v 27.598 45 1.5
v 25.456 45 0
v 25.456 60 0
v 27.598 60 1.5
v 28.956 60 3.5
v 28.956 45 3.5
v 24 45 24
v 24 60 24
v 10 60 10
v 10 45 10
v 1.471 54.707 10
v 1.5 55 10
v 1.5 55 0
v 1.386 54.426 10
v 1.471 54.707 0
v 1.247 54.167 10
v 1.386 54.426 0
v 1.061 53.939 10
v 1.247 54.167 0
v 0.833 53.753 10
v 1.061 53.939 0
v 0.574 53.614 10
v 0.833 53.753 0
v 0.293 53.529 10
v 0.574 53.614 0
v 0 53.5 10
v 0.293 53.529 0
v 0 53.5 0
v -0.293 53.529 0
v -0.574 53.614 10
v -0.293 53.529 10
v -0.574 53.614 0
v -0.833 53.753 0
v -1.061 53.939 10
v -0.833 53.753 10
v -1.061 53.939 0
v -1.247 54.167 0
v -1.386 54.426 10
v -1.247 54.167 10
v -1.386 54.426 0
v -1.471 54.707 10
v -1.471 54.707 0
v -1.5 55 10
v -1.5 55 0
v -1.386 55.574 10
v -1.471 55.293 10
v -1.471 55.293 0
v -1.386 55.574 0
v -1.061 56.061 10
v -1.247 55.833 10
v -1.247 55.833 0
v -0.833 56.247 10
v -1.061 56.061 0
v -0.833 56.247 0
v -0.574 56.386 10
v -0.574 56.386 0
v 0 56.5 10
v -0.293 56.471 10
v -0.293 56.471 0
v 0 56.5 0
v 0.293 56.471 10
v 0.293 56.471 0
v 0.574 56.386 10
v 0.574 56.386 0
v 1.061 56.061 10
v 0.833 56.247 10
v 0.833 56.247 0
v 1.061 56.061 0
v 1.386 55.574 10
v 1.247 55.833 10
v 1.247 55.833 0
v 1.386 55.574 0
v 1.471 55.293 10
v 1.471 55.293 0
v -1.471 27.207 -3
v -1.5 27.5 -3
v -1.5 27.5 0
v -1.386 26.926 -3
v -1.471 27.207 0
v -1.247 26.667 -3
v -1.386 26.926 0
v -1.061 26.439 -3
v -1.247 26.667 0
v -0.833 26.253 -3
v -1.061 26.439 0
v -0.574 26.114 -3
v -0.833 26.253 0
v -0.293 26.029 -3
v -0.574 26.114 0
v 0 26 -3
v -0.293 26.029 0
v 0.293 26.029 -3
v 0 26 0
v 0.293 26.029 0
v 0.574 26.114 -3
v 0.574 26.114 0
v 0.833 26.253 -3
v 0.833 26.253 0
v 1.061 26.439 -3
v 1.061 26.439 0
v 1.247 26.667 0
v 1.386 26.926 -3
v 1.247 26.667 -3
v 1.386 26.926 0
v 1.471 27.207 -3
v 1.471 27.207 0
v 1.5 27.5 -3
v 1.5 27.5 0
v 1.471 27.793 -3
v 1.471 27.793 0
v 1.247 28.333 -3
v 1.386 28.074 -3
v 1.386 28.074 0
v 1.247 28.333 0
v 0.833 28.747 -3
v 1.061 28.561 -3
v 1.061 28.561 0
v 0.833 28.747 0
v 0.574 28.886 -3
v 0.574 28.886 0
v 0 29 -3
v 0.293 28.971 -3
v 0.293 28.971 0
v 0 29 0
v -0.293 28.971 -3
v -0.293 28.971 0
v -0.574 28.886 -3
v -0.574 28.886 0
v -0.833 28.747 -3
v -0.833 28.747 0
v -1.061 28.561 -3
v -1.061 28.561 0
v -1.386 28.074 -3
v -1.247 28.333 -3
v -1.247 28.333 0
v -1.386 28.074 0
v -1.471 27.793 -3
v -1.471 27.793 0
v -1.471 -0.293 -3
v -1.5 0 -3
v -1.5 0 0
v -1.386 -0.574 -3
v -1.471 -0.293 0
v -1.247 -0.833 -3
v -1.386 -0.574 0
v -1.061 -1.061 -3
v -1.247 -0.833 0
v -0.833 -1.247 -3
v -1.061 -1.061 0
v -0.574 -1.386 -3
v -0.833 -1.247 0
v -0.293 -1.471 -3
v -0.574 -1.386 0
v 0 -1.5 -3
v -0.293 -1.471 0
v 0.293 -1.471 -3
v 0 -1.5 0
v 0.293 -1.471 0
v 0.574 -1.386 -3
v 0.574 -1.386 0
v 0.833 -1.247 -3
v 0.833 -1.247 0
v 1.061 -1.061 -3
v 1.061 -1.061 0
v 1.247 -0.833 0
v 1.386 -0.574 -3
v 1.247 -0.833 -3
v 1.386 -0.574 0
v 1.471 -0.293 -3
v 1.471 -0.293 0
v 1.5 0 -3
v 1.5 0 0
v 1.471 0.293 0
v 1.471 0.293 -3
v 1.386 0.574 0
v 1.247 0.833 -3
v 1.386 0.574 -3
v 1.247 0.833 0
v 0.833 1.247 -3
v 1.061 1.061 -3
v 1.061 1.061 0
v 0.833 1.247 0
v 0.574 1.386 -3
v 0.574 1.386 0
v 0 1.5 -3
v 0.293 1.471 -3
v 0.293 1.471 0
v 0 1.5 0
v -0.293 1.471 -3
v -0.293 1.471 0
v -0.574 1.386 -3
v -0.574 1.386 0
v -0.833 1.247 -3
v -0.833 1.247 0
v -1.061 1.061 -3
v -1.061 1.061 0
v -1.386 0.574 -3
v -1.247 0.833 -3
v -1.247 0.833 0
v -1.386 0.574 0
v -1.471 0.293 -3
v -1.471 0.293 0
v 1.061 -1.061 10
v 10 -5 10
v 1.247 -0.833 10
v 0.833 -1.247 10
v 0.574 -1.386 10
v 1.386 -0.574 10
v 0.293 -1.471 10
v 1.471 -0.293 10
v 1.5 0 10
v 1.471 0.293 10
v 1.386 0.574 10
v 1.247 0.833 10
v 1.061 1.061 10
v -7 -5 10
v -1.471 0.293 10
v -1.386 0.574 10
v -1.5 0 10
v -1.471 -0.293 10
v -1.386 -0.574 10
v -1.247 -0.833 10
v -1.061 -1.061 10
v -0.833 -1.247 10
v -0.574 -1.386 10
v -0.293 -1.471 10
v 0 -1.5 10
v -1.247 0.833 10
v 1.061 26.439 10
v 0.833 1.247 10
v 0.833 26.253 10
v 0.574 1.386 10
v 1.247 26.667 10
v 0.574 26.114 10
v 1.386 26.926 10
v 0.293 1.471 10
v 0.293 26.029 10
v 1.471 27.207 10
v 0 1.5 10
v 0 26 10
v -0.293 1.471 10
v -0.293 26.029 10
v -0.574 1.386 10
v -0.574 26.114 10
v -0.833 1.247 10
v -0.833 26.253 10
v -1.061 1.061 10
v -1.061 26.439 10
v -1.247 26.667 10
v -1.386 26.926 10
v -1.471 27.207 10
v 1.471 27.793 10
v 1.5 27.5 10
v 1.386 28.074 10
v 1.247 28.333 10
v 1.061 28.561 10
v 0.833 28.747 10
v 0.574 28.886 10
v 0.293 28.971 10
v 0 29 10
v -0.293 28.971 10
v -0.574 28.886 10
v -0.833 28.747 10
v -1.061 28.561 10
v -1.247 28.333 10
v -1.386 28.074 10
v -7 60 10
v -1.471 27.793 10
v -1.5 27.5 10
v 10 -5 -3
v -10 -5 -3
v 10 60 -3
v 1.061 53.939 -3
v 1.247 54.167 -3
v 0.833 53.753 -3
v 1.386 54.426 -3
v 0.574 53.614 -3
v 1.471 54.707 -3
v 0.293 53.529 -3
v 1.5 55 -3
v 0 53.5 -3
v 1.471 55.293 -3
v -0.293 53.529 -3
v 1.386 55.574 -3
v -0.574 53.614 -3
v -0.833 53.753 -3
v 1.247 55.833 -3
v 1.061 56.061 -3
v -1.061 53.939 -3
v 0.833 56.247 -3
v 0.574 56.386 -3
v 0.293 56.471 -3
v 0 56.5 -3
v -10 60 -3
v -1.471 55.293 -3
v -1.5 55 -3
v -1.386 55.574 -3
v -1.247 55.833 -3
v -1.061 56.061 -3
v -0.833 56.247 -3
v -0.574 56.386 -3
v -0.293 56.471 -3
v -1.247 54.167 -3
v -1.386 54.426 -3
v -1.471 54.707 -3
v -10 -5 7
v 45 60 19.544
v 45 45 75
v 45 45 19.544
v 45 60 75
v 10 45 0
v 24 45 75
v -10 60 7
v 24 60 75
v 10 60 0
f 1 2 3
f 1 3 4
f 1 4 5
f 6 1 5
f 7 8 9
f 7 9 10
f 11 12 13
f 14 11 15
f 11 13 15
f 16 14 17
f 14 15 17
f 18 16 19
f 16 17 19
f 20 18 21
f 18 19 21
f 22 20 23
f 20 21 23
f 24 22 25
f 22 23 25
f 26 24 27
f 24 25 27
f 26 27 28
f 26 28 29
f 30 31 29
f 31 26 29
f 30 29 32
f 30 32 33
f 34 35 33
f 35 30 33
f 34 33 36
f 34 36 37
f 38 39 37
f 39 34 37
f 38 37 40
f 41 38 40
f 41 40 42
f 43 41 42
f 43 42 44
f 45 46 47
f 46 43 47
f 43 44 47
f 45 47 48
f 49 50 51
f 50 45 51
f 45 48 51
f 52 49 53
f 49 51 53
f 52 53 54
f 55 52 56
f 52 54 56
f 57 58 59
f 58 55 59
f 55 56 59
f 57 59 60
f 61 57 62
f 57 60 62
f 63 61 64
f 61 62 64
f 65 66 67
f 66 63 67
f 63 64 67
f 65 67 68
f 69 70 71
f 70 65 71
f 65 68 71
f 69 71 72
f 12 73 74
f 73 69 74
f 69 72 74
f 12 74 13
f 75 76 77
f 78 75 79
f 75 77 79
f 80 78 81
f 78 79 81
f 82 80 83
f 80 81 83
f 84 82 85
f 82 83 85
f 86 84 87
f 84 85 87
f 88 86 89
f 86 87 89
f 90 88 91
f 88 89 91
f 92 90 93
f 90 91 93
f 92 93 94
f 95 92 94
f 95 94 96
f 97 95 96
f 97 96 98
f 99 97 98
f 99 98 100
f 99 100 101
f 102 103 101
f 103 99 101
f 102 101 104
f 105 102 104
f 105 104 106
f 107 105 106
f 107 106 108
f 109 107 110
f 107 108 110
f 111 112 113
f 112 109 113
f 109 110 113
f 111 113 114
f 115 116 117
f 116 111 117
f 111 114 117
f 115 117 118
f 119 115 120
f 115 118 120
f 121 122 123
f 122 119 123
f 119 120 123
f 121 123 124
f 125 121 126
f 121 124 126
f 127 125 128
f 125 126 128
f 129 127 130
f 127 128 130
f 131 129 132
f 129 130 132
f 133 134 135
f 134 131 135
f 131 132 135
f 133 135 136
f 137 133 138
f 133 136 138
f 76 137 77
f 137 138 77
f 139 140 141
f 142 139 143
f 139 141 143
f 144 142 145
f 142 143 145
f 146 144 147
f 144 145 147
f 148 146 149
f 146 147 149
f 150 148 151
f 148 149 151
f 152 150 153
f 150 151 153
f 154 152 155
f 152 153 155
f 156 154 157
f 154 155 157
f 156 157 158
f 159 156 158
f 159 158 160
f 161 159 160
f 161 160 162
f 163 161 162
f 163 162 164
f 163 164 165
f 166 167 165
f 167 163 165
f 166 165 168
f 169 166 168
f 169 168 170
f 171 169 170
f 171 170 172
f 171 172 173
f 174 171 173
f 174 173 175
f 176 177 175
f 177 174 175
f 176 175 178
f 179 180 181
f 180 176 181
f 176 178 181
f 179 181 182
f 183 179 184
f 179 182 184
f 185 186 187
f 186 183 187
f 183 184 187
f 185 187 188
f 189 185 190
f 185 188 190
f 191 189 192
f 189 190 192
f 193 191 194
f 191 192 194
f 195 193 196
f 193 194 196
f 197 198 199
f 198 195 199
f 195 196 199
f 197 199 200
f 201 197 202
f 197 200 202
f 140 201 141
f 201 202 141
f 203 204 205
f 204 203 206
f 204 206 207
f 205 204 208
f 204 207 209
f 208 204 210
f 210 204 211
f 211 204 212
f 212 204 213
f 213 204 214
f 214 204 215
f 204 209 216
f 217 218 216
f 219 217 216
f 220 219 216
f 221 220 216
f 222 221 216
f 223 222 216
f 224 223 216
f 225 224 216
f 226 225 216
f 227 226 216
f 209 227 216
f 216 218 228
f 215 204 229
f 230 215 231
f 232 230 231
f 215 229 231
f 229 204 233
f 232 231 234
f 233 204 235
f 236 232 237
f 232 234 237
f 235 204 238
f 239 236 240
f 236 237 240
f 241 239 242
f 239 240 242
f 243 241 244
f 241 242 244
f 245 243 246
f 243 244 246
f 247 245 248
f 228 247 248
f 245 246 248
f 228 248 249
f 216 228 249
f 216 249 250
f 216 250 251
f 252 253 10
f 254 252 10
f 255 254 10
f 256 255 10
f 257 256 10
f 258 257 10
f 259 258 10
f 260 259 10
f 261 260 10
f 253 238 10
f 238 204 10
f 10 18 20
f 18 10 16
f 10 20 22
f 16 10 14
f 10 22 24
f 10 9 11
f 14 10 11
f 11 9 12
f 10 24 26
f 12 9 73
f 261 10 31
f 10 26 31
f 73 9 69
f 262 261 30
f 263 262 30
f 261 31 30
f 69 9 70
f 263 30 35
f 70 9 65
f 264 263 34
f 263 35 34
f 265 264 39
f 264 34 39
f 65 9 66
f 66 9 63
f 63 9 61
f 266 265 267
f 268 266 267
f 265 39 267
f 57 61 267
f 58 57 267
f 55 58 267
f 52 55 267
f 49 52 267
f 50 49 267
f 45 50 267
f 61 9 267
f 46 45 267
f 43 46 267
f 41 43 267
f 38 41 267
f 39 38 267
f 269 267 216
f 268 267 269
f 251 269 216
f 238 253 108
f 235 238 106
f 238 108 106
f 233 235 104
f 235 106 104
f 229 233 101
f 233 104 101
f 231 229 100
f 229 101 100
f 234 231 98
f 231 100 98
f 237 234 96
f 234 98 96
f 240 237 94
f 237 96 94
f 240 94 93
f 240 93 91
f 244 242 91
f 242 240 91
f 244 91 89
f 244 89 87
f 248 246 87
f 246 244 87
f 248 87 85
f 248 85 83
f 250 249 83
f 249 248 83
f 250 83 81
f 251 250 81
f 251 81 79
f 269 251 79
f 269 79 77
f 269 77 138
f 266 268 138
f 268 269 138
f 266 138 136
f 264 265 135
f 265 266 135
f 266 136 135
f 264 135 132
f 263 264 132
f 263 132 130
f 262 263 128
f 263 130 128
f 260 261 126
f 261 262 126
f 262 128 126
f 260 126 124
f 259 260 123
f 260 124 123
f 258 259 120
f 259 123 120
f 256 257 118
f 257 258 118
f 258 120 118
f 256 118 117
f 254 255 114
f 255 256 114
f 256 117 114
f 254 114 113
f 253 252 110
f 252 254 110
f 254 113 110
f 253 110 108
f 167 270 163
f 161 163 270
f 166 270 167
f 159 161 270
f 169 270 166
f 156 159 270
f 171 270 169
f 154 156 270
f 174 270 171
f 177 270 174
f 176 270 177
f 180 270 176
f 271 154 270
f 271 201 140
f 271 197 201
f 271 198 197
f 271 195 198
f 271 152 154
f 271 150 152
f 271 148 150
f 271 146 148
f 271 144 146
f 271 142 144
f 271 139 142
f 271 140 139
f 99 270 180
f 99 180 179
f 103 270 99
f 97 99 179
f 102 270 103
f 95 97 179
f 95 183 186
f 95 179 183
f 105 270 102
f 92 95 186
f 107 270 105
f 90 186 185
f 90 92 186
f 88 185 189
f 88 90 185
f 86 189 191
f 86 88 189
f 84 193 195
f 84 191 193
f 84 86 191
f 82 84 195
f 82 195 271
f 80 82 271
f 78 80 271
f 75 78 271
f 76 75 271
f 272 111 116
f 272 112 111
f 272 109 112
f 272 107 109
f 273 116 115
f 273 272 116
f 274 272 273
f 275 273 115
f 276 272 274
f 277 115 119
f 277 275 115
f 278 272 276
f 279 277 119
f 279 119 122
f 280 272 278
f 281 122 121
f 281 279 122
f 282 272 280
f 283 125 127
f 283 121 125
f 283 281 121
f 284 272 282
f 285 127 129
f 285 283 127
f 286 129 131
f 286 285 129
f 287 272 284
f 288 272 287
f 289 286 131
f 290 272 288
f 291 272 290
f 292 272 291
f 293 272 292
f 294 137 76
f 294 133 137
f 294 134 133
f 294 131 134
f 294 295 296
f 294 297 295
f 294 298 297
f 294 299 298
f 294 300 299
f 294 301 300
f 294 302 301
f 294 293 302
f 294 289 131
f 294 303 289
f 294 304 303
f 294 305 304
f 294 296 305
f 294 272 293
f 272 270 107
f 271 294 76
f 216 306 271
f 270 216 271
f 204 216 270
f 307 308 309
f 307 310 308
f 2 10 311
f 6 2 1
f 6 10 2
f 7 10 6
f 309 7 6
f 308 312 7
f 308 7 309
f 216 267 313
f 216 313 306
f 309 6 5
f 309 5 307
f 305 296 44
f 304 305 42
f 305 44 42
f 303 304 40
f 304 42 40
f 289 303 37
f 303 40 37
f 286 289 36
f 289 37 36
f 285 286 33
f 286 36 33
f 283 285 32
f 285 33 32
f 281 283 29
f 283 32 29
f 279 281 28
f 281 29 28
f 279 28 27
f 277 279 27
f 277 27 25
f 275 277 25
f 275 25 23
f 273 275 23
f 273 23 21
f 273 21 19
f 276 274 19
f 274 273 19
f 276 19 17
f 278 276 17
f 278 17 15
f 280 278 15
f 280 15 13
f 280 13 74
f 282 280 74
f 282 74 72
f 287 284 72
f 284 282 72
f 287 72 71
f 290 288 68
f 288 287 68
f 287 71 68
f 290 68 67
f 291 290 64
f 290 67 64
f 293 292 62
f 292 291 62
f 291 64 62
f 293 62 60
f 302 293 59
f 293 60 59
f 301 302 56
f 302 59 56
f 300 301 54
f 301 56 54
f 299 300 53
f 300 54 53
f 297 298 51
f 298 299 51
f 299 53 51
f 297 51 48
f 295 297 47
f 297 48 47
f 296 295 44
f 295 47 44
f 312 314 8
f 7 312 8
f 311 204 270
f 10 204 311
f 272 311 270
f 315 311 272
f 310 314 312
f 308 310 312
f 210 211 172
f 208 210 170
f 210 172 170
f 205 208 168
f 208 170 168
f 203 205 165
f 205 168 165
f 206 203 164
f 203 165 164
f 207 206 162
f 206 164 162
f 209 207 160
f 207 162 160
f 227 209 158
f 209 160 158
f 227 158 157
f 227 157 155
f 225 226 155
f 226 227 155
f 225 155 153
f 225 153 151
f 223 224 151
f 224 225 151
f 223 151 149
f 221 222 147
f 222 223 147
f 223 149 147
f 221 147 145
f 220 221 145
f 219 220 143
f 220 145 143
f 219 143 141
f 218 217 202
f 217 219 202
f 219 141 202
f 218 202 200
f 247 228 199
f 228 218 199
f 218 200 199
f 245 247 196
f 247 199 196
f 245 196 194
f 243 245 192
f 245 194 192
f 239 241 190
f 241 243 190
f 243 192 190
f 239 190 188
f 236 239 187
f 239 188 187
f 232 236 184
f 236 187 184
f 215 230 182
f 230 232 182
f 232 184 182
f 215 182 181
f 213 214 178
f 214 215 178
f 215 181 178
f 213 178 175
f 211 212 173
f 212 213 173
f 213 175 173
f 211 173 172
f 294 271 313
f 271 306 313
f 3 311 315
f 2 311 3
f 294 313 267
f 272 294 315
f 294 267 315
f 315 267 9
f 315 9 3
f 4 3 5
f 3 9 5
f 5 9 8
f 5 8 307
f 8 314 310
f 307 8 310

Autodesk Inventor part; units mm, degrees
ref_plane "YZ Plane" through (0, 0, 0) normal (1, 0, 0) x (0, 1, 0)
ref_plane "XZ Plane" through (0, 0, 0) normal (0, 1, 0) x (-1, 0, 0)
ref_plane "XY Plane" through (0, 0, 0) normal (0, 0, 1) x (1, 0, 0)
sketch "Sketch9" plane through (0, 0, 0) normal (0, 0, 1) x (1, 0, 0)
  line L0 (0, 0) -> (0, 55) construction
  circle A0 centre (0, 55) radius 1.5
  circle A1 centre (0, 0) radius 1.5
  circle A2 centre (0, 27.5) radius 1.5
  line L1 (-10, 60) -> (10, 60)
  line L2 (10, 60) -> (10, -5)
  line L3 (10, -5) -> (-10, -5)
  line L4 (-10, -5) -> (-10, 60)
  point P0 (-10, 27.5)
  point P1 (0, 60)
  dimension "d35" = 55
  dimension "d36" = 3
  dimension "d37" = 3
  dimension "d38" = 3
  dimension "d39" = 5
  dimension "d40" = 10
extrude "Extrusion9" add sketch "Sketch9" along normal blind 10
sketch "Sketch11" plane through (10, -5, 0) normal (1, 0, 0) x (0, 0, -1)
  line L0 (0, 65) -> (-10, 65) projected
  line L1 (0, 65) -> (-75, 65)
  line L2 (-75, 65) -> (-75, 50)
  line L3 (-75, 50) -> (0, 50)
  line L4 (0, 50) -> (0, 65)
  point P0 (0, 5)
  dimension "d43" = 15
  dimension "d44" = 75
extrude "Extrusion10" add sketch "Sketch11" along normal blind 35
sketch "Sketch12" plane through (-10, 60, 10) normal (0, 1, 0) x (1, 0, 0)
  line L0 (20, -65) -> (20, 0) projected
  line L1 (20, -65) -> (34, -65)
  line L2 (34, -65) -> (34, 0)
  line L3 (34, 0) -> (20, 0)
  line L4 (20, 0) -> (20, -65)
  point P0 (10, 10)
  dimension "d47" = 14
extrude "Extrusion11" cut sketch "Sketch12" against normal through all
chamfer "Chamfer6" distance 14 angle 45 1 edges at (24, 52.5, 10)
sketch "Sketch14" plane through (10, 45, 0) normal (0, -1, 0) x (1, 0, 0)
  line L0 (0, 10) -> (14, 24) projected
  line L1 (15.4558, 0) -> (35, 19.5442)
  line L2 (35, 75) -> (35, 0) projected
  line L3 (0, 0) -> (35, 0) projected
  line L4 (15.4558, 0) -> (35, 0)
  line L5 (35, 19.5442) -> (35, 0)
  point P0 (-10, 0)
  dimension "d73" = 18
extrude "Extrusion13" cut sketch "Sketch14" against normal through all
sketch "Sketch15" plane through (0, 0, 0) normal (0, 0, -1) x (-1, 0, 0)
  line L0 (-25.4558, 60) -> (-25.4558, 45) projected
  line L1 (-10, 45) -> (-25.4558, 45) projected
  line L2 (-10, 45) -> (-10, -5) projected
  line L3 (-10, -5) -> (10, -5) projected
  line L4 (10, -5) -> (10, 60) projected
  line L5 (10, 60) -> (-25.4558, 60) projected
  circle A0 centre (0, 55) radius 1.5 projected
  circle A1 centre (0, 0) radius 1.5 projected
  circle A2 centre (0, 27.5) radius 1.5 projected
  line L6 (-10, -5) -> (10, -5) projected
  line L7 (10, 60) -> (-10, 60) projected
  line L8 (-10, -5) -> (-10, 60)
  line L9 (-10, 60) -> (10, 60)
extrude "Extrusion14" add sketch "Sketch15" along normal blind 3 contours L5 L4 L3 L2 L8
chamfer "Chamfer8" distance 3 angle 45 1 edges at (-10, 27.5, 10)
sketch "Sketch17" plane through (-10, -5, -3) normal (0, -1, 0) x (1, 0, 0)
  line L0 (20, 3) -> (20, 13) projected
  line L1 (20, 3) -> (35.4558, 3) projected
  line L2 (20, 3) -> (35.4558, 3)
  line L3 (35.4558, 3) -> (37.5981, 4.5)
  line L4 (37.5981, 4.5) -> (49, 4.5)
  line L5 (49, 6.5) -> (36.9675, 6.5)
  line L6 (36.9675, 6.5) -> (34.8252, 5)
  line L7 (34.8252, 5) -> (20, 5)
  line L8 (20, 3) -> (20, 5)
  line L9 (49, 6.5) -> (49, 4.5)
  point P0 (10, 3)
  point P1 (55, 22.5442)
  dimension "d83" = 215
  dimension "d84" = 2
  dimension "d88" = 1.5
  dimension "d89" = 6
extrude "Extrusion16" add sketch "Sketch17" against normal blind 65
sketch "Sketch18" plane through (24, 60, 75) normal (0, 1, 0) x (1, 0, 0)
  line L0 (15, 73.5) -> (3.5981, 73.5) projected
  line L1 (4.9558, 71.5) -> (15, 71.5) projected
  line L2 (15, 71.5) -> (15, 73.5) projected
  line L3 (3.5981, 73.5) -> (4.9558, 71.5)
  point P0 (-24, 75)
extrude "Extrusion17" cut sketch "Sketch18" against normal through all
sketch "Sketch19" plane through (-10, -5, -3) normal (0, -1, 0) x (1, 0, 0)
  line L0 (34.8252, 5) -> (20, 5) projected
  line L1 (20, 3) -> (35.4558, 3) projected
  line L2 (35.4558, 3) -> (37.5981, 4.5) projected
  line L3 (37.5981, 4.5) -> (38.9558, 6.5) projected
  line L4 (38.9558, 6.5) -> (36.9675, 6.5) projected
  line L5 (36.9675, 6.5) -> (34.8252, 5) projected
  line L6 (20, 3) -> (20, 5)
  point P0 (10, 3)
extrude "Extrusion18" cut sketch "Sketch19" against normal blind 50
equation "\"Module\" = 2"
equation "\"PressureAngle\" = 20deg"
equation "\"UnitProfileClearance\" = 0.25"
equation "\"UnitRoundRadius\" = 0.35"
equation "\"HeadDiameter\" = 42"
equation "\"RootDiameter\" = 33"
equation "\"BaseDiameter\" = 35.70832"
equation "\"PitchDiameter\" = 38"
equation "\"HelixAngle\" = 0"
equation "\"UnitCorrection\" = 0"
equation "\"UnitAddendumModification\" = 0"
equation "\"CircularPitch\" = 6.283185"
equation "\"UnitBacklashShift\" = 0"
equation "\"TotalToolShift\" = 0"
equation "\"IsInternal\" = 0"
properties part number "GA04" material "ABS Plastic"
